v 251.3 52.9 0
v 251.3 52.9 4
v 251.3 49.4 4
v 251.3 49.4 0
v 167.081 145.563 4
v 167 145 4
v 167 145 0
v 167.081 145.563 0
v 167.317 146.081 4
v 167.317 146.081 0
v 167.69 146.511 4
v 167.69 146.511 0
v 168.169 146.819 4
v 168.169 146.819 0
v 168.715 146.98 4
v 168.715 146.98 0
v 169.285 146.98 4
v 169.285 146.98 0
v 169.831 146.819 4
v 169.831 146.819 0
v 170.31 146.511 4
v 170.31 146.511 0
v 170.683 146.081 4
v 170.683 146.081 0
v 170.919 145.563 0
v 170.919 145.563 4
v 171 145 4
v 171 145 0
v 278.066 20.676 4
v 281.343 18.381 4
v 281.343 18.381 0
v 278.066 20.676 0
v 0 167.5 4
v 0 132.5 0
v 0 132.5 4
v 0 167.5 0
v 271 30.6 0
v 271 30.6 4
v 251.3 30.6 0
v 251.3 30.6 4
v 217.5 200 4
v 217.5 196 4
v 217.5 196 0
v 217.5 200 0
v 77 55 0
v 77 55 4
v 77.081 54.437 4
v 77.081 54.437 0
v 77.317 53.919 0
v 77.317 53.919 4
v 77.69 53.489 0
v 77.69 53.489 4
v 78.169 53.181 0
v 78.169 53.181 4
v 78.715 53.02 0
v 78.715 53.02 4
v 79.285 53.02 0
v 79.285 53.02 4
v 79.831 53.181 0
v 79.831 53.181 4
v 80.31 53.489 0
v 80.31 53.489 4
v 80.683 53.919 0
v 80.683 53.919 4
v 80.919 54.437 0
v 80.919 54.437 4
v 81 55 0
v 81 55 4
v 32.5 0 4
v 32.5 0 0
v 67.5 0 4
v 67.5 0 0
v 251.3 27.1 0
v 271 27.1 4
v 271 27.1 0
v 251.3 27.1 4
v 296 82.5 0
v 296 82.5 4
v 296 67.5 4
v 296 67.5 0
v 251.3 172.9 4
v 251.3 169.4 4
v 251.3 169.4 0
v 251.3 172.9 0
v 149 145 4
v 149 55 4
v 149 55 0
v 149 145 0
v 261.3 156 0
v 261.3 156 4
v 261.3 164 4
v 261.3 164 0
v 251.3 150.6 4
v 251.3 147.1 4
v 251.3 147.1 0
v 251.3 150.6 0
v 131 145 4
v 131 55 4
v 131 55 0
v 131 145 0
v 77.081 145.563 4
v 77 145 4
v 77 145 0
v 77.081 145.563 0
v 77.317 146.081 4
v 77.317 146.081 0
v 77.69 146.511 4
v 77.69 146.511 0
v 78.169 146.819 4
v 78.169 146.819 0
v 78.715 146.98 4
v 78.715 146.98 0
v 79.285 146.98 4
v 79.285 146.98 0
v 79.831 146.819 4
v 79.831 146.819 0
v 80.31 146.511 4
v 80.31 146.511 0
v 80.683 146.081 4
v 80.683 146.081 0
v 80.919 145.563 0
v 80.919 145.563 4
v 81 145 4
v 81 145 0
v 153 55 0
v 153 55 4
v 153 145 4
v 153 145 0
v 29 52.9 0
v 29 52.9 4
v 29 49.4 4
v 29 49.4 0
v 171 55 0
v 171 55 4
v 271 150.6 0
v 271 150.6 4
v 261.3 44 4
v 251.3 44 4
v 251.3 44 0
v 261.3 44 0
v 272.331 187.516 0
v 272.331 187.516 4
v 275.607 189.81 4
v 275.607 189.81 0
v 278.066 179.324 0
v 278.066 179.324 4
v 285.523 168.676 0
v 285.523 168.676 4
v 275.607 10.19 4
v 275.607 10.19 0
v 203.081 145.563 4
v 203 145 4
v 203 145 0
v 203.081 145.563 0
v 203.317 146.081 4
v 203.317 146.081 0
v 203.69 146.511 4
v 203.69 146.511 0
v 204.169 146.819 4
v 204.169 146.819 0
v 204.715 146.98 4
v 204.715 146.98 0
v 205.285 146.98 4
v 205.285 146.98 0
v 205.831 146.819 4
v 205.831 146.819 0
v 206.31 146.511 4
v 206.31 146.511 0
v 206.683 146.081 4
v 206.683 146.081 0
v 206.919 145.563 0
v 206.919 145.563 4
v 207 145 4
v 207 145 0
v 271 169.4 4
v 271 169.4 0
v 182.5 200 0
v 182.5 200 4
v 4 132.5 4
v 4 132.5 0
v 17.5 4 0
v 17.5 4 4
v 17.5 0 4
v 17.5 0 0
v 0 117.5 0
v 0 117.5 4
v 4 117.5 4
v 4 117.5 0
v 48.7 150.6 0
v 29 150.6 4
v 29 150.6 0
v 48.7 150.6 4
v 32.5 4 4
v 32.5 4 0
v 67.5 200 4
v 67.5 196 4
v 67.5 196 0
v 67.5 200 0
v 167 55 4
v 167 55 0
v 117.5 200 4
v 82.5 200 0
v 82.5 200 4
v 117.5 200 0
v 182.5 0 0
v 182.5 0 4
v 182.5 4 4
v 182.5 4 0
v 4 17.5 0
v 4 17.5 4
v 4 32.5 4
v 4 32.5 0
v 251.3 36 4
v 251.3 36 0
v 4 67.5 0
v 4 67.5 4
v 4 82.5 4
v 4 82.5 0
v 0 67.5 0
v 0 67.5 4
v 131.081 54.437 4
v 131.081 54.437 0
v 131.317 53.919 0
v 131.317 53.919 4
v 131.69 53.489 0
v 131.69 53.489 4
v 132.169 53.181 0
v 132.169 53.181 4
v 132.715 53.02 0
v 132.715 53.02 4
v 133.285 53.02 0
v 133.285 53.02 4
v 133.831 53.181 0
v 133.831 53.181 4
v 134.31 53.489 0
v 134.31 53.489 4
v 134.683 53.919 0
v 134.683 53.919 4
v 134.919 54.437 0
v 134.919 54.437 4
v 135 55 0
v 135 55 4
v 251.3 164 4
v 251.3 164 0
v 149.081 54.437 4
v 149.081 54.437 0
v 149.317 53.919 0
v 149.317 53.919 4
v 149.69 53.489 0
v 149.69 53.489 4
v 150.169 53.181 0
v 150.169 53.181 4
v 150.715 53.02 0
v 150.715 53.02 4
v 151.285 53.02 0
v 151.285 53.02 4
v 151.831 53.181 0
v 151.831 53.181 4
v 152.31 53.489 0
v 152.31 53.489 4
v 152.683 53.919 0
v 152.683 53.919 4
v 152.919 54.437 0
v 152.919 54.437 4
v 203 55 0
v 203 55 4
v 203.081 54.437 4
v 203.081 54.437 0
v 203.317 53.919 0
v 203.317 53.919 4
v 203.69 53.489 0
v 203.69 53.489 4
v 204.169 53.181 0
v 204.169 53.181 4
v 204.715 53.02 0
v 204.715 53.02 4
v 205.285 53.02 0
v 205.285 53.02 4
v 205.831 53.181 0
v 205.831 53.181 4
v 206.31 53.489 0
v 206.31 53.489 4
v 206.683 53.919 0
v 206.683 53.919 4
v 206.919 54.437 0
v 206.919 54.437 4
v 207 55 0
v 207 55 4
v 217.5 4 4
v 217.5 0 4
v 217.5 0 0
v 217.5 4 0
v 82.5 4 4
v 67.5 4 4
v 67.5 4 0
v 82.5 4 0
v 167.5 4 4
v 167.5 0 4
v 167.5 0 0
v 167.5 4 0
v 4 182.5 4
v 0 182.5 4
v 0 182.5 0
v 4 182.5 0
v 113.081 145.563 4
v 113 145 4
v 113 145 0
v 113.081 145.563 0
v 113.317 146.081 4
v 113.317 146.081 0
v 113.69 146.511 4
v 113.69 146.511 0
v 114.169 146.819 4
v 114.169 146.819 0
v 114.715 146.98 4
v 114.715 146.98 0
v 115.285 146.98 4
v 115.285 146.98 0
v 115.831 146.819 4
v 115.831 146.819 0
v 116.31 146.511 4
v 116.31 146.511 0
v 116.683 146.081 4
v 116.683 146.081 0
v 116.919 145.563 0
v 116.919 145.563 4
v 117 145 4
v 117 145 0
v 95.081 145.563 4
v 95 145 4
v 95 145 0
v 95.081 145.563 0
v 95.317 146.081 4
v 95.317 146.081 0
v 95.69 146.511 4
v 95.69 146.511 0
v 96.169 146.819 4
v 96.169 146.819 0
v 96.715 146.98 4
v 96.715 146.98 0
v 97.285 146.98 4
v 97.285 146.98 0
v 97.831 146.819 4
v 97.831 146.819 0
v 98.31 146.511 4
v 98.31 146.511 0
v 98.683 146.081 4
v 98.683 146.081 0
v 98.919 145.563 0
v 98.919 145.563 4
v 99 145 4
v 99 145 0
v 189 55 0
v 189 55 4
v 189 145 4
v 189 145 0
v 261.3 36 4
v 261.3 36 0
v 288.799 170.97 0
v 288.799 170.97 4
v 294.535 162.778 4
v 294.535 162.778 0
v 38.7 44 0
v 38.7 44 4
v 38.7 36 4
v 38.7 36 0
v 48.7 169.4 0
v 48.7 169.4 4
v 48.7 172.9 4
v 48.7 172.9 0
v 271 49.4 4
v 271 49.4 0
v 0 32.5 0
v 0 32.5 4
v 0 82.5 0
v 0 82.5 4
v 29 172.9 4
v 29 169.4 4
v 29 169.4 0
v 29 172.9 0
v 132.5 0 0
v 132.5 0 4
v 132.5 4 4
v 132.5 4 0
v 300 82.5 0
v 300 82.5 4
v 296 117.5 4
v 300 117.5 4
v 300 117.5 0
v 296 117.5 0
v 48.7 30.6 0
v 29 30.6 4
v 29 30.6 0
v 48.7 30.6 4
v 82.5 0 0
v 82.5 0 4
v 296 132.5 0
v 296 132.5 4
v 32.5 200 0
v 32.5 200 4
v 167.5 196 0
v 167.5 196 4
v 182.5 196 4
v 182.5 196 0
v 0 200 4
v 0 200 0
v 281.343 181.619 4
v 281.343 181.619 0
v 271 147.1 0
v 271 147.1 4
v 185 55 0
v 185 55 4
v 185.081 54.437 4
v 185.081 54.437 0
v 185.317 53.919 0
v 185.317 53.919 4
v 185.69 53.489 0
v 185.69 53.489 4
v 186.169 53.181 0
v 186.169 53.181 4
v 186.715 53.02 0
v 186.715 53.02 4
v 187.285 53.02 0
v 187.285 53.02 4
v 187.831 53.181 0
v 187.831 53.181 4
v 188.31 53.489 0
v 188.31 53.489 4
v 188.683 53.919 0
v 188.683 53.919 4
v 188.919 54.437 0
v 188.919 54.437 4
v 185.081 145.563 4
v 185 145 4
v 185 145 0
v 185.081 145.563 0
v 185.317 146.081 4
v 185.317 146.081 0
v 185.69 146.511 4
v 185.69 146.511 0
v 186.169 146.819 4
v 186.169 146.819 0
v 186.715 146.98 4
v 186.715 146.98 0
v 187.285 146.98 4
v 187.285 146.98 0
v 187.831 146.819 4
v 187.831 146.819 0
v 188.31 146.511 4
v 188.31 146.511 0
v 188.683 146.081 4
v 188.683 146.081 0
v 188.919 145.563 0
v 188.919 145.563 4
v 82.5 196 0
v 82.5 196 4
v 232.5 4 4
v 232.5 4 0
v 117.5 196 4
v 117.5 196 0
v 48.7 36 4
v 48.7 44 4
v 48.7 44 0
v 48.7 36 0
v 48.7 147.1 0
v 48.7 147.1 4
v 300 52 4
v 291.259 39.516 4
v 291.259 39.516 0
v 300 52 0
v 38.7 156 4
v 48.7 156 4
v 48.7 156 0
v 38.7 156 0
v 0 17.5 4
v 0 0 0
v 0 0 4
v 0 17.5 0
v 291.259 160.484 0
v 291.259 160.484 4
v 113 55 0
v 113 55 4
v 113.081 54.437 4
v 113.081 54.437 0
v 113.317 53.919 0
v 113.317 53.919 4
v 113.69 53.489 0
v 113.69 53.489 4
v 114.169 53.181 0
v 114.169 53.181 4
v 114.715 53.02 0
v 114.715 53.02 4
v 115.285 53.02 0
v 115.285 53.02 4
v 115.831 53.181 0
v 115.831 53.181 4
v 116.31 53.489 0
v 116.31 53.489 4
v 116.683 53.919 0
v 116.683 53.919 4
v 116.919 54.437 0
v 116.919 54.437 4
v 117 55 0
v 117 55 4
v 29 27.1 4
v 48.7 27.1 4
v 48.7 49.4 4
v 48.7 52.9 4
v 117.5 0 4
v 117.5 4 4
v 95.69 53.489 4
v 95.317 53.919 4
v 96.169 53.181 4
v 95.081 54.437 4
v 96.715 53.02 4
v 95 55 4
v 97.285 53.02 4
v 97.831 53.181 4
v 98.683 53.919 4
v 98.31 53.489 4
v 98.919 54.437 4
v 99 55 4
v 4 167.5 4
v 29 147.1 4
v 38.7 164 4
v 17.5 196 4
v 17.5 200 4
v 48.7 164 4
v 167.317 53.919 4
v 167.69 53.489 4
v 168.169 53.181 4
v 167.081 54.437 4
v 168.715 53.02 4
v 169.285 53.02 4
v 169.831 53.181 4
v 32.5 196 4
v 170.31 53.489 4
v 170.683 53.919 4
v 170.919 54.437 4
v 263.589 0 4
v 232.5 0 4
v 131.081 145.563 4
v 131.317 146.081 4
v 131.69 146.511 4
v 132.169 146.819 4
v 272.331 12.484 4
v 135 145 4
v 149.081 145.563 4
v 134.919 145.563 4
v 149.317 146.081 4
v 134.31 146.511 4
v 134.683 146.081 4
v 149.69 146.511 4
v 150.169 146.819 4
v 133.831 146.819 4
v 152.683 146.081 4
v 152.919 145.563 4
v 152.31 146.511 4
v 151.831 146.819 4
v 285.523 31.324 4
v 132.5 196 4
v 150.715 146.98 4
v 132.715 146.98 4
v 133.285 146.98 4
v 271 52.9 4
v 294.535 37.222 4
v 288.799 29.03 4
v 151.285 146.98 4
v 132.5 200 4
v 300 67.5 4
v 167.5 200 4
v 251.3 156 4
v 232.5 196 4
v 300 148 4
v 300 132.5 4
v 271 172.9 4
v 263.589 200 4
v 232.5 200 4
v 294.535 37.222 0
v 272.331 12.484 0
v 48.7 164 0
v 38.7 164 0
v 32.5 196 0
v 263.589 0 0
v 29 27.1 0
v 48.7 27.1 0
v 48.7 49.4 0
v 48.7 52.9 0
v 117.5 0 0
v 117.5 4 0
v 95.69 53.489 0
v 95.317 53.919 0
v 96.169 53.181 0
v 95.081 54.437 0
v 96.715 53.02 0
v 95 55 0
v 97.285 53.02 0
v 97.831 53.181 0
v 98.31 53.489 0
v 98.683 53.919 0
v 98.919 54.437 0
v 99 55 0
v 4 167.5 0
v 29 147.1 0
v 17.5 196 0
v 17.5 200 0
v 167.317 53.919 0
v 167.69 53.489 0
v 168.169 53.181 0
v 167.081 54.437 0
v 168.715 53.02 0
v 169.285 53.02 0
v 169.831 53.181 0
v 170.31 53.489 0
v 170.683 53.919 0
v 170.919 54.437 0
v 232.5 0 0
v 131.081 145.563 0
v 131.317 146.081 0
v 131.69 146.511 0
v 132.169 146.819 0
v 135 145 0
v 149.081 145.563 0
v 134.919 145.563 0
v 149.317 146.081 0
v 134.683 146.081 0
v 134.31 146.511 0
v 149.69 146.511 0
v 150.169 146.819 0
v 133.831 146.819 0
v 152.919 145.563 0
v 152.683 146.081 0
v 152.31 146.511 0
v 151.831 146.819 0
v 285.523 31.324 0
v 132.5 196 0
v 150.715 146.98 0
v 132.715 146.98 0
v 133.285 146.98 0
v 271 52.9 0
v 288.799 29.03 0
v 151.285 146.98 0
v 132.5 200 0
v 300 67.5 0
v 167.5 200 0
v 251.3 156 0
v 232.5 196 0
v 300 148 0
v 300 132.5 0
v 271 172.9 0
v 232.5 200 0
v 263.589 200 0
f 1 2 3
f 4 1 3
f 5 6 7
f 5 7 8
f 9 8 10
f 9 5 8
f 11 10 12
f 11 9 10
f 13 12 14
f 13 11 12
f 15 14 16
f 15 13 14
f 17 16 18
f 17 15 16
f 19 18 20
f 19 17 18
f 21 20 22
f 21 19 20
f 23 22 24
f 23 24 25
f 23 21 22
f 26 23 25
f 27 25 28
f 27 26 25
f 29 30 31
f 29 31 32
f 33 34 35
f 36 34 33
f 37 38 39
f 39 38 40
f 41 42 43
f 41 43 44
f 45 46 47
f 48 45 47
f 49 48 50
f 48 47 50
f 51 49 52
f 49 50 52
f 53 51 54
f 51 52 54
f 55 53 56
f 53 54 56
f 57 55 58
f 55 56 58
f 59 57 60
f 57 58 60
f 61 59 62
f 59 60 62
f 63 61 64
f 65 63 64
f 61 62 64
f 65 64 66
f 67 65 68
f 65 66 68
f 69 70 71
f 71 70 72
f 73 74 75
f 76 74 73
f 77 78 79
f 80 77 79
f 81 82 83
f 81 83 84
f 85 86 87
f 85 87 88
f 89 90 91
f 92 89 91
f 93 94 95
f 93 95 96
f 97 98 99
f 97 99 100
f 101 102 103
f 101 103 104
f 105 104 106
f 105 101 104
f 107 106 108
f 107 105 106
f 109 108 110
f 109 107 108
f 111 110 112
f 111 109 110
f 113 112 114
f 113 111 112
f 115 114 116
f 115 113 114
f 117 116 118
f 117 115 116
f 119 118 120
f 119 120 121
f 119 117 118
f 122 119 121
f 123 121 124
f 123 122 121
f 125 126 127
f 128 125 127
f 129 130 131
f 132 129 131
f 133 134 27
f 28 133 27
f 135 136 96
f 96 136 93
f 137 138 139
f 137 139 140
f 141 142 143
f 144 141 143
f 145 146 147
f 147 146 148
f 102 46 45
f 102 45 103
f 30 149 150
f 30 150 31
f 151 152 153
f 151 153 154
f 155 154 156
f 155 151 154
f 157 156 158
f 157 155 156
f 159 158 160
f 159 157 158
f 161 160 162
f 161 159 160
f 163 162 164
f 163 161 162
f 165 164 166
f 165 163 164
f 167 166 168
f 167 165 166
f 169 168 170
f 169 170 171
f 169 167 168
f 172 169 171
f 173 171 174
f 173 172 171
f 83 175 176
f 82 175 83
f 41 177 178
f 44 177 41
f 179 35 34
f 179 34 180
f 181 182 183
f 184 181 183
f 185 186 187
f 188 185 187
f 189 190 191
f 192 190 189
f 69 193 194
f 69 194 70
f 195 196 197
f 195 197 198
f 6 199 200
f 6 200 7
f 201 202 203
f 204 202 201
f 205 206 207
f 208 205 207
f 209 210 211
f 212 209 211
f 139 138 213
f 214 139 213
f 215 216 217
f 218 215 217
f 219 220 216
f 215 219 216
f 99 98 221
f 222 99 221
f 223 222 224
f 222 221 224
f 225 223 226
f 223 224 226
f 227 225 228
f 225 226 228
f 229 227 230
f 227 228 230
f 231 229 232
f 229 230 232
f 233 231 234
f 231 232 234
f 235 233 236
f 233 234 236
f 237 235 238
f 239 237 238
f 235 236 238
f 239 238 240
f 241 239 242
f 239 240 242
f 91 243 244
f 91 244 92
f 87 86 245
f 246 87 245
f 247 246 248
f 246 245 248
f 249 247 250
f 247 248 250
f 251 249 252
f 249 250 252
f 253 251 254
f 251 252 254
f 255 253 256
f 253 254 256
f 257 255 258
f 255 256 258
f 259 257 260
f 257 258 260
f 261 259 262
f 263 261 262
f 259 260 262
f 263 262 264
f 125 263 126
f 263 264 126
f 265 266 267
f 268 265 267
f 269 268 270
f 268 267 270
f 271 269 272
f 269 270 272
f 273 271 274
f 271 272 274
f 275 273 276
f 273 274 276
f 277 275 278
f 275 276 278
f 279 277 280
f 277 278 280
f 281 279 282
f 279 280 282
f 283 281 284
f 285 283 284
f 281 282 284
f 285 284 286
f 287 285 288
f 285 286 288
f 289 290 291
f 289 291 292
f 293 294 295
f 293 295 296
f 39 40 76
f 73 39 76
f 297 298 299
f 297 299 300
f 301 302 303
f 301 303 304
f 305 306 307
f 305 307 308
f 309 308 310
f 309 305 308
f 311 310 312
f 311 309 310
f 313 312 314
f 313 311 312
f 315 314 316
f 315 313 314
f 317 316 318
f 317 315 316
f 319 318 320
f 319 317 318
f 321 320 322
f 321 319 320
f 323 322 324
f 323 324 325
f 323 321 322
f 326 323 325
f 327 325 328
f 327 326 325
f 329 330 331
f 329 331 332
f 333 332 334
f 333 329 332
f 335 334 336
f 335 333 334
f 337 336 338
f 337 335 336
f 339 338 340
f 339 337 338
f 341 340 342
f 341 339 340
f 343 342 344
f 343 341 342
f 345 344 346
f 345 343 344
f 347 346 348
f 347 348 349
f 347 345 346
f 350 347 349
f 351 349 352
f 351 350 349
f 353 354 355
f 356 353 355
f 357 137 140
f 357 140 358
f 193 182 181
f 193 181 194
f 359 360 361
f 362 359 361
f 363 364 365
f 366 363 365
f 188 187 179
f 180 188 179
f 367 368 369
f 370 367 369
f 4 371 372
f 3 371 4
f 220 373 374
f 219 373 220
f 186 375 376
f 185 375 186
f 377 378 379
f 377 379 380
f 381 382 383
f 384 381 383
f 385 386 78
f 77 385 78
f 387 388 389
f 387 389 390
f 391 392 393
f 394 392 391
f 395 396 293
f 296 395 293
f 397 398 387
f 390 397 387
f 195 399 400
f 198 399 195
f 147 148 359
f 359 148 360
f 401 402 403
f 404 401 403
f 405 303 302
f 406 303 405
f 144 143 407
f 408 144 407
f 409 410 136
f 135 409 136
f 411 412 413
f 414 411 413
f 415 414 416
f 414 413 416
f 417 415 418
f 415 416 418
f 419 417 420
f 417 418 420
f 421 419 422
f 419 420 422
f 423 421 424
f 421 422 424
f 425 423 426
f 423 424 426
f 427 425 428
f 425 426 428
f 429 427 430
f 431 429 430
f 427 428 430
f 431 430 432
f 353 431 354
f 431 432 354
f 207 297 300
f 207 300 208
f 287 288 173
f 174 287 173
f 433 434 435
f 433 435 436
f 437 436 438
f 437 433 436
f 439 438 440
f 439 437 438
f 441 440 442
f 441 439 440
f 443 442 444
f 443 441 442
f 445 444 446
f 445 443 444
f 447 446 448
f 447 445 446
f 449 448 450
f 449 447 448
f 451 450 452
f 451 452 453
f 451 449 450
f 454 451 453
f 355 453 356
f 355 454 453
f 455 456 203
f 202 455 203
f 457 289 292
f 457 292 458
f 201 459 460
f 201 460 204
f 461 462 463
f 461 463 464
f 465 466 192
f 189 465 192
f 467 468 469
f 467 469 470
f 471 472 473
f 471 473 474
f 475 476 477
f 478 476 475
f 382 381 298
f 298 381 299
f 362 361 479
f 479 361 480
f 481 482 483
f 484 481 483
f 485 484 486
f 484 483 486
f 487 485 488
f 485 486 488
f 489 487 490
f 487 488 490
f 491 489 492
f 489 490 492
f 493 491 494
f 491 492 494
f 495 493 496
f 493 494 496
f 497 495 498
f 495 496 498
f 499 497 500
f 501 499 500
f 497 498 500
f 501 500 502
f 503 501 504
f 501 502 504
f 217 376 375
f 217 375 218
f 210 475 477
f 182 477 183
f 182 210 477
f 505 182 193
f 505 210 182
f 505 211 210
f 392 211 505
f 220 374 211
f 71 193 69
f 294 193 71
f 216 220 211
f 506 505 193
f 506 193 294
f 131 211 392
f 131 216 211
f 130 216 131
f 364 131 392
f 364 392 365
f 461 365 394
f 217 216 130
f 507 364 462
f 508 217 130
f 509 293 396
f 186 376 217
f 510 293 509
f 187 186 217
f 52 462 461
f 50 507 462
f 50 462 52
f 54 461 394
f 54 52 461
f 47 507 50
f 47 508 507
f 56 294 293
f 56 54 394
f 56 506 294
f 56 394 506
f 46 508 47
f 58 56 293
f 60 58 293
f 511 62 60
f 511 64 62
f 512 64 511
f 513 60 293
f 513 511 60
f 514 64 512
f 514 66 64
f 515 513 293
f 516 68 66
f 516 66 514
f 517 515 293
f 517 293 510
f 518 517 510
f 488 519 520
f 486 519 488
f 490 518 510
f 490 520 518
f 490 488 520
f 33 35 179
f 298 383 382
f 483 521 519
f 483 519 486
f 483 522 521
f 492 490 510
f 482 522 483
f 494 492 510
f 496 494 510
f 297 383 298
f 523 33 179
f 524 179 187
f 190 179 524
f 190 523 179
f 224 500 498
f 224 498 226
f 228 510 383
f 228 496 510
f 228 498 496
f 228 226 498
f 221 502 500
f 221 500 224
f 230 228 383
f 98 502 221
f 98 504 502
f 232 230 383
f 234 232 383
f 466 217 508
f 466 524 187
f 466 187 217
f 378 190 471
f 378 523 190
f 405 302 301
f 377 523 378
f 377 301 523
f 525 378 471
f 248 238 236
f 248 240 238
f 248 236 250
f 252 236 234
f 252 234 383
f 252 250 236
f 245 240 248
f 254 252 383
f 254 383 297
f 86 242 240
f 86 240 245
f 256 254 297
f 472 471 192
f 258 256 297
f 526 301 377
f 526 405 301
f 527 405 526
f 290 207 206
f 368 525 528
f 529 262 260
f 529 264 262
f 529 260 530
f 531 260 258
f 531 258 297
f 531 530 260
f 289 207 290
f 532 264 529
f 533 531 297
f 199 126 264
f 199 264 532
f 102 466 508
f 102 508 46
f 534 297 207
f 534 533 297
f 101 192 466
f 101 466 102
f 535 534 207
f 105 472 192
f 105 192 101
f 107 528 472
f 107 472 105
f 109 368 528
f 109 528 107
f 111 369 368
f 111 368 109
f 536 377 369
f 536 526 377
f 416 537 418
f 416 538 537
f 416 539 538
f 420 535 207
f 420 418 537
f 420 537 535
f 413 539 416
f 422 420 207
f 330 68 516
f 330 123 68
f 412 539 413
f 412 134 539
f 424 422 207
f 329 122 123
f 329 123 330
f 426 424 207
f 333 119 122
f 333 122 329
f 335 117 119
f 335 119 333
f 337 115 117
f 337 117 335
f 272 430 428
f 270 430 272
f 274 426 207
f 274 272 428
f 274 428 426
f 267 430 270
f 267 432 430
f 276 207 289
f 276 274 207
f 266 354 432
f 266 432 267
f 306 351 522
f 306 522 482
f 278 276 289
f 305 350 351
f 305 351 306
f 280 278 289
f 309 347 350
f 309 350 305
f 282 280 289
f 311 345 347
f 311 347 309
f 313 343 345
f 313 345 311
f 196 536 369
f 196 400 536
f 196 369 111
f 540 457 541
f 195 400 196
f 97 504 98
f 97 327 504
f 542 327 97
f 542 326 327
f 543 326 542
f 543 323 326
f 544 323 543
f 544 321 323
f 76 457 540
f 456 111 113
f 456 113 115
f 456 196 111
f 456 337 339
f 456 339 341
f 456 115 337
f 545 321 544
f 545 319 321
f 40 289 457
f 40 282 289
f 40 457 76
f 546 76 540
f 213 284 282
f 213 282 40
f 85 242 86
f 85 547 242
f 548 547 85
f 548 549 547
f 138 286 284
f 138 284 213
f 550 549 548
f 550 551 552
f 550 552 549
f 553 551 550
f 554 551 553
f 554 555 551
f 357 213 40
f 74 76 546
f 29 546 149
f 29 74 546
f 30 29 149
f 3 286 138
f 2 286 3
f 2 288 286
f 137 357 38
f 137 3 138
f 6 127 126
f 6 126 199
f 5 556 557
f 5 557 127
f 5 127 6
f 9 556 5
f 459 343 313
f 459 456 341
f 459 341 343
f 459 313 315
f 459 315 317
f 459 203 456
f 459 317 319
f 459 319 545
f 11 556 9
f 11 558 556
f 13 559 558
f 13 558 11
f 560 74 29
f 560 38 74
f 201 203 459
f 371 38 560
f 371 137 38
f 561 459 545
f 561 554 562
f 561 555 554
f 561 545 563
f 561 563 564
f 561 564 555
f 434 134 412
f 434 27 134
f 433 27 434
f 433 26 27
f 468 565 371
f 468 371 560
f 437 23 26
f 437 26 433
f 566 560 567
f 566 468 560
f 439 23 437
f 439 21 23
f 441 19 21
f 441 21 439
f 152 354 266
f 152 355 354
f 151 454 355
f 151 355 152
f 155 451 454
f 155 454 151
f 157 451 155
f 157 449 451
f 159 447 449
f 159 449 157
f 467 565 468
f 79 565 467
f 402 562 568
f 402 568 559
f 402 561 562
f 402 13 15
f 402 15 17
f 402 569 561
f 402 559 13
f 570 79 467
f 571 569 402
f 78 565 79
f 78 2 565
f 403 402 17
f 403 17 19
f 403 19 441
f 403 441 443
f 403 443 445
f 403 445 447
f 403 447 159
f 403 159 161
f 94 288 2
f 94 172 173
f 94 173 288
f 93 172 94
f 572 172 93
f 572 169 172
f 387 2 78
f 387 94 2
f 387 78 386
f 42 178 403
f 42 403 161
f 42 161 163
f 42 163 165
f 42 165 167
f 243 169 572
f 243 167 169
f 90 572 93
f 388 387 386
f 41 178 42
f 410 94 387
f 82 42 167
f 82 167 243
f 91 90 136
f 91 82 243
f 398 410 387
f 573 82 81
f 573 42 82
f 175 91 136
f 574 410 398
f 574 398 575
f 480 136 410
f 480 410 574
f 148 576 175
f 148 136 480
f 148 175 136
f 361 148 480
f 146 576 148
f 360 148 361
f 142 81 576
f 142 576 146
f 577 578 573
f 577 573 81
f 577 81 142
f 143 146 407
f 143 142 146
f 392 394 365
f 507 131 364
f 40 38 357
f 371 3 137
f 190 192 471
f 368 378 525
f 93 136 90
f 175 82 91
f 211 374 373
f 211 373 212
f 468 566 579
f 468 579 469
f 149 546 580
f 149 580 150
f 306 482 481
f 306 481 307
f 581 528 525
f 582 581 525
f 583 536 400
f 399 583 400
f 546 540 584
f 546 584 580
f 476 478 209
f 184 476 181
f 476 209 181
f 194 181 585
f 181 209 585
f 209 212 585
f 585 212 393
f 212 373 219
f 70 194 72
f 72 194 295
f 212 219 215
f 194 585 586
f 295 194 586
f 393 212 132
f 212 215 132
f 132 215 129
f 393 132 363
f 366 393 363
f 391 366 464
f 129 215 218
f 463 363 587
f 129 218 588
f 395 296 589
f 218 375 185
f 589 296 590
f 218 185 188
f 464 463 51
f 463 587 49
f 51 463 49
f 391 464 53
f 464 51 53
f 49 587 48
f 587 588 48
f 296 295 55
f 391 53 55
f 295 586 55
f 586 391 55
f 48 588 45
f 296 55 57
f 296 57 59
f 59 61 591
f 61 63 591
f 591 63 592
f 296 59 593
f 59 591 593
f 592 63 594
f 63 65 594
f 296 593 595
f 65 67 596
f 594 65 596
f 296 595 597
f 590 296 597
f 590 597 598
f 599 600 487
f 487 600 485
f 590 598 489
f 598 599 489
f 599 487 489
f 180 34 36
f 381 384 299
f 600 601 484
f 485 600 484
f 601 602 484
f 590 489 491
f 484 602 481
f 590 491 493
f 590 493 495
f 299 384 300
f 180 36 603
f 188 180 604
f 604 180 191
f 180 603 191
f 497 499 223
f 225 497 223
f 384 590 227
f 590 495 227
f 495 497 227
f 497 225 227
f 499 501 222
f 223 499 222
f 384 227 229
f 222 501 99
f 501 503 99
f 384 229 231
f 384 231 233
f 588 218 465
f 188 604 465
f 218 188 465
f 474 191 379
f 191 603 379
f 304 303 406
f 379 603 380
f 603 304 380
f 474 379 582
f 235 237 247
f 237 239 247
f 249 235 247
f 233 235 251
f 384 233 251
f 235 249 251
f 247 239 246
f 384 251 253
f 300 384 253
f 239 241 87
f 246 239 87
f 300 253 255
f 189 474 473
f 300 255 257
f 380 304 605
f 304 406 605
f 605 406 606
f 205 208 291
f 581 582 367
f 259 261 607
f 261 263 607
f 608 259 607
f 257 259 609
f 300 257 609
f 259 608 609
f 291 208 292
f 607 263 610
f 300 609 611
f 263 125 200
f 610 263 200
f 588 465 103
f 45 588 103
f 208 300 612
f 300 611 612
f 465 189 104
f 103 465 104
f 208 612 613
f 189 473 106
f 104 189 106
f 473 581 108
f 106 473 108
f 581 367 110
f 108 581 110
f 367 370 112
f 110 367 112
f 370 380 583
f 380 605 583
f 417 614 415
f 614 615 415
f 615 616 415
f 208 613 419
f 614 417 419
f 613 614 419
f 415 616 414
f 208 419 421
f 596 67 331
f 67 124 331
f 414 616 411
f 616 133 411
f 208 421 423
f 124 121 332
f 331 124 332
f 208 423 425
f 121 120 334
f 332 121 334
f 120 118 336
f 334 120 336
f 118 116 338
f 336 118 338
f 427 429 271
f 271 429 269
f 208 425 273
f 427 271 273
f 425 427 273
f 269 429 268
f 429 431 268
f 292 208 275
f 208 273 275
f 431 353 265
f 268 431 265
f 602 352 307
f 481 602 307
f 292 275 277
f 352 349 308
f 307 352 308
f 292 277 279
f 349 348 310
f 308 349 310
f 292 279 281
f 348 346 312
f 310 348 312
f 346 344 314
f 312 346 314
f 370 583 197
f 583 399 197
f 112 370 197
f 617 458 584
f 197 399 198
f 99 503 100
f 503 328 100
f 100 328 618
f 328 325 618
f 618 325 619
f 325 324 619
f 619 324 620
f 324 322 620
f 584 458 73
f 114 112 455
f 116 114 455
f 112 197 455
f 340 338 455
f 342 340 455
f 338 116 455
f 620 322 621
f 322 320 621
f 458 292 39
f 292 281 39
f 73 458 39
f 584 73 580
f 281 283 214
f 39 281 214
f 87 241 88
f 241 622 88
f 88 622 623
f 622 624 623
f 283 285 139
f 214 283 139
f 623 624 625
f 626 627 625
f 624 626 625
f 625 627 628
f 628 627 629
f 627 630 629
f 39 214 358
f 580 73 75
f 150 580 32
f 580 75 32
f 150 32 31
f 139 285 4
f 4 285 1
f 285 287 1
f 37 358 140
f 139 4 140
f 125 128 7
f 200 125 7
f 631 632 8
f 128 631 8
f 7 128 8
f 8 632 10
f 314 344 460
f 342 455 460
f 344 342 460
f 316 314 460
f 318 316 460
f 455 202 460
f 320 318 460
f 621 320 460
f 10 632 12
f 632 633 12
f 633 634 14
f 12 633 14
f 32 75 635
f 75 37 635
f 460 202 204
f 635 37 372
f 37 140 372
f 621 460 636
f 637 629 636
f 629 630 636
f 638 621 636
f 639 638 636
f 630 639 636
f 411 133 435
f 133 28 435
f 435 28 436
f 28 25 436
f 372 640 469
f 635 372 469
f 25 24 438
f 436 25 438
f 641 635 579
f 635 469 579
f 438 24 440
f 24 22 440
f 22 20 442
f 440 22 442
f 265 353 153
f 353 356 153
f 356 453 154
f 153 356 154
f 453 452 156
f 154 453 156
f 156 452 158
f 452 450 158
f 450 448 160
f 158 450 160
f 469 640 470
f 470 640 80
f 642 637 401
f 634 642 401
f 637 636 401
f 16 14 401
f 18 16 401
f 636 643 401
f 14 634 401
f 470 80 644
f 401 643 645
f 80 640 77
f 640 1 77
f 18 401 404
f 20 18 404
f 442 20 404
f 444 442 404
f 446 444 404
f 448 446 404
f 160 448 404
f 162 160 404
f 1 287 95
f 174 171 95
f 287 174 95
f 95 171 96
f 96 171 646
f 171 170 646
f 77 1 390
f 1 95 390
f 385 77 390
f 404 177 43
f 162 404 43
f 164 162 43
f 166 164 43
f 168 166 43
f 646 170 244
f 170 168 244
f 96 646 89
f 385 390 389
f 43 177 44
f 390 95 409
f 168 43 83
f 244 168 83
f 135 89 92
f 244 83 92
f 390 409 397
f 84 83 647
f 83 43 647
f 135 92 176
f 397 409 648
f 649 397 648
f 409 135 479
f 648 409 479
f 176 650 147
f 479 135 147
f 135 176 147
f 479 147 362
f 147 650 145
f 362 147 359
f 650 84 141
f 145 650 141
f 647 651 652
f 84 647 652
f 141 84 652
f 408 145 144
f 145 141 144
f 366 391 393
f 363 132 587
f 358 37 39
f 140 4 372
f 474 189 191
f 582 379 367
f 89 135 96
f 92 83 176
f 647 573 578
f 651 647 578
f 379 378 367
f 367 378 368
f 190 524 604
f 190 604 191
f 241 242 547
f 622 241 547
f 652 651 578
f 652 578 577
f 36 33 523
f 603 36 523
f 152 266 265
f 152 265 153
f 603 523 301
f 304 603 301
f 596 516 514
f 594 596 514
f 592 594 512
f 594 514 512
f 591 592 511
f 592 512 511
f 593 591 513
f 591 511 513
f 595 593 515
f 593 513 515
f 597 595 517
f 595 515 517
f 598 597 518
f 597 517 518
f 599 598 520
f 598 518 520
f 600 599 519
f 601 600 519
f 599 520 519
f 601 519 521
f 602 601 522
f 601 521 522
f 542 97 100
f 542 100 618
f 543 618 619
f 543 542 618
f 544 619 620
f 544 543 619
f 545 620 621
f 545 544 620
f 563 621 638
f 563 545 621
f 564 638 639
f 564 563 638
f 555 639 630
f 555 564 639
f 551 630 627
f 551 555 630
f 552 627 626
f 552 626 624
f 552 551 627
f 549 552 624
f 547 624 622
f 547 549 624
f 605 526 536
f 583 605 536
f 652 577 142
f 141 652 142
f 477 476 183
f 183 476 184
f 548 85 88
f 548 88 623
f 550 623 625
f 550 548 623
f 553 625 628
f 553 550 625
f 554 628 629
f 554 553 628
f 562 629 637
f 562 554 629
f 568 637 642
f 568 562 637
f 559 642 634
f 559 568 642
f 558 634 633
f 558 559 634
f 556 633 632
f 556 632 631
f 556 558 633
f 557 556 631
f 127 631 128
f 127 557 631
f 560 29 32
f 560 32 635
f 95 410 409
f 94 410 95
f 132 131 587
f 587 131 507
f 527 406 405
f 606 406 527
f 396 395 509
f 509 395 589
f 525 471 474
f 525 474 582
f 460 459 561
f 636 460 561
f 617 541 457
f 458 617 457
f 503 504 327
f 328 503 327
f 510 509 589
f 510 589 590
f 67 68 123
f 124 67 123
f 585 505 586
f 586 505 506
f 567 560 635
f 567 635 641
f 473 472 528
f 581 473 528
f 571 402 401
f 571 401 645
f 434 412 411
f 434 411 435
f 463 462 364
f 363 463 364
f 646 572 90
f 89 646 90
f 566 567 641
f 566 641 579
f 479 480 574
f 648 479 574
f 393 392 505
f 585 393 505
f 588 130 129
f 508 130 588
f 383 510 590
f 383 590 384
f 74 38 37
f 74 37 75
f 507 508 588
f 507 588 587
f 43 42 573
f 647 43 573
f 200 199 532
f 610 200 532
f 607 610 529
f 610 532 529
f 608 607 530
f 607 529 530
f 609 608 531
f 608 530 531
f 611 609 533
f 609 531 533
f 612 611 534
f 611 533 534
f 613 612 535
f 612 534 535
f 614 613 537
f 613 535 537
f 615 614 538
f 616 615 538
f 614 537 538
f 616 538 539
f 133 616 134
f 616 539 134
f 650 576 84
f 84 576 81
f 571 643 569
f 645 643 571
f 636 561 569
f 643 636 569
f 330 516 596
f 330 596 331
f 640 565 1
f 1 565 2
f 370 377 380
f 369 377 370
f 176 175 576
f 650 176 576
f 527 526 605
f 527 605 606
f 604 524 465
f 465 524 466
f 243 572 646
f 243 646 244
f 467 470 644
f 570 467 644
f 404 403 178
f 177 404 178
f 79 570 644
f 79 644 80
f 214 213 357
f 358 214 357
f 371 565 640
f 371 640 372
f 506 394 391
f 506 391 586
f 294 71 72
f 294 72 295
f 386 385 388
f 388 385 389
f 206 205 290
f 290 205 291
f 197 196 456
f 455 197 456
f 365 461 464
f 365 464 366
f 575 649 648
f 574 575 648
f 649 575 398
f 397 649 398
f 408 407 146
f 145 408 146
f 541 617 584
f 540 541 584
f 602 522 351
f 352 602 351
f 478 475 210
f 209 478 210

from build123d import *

# Parameters (mm, degrees)
SKIZZE2_W                       = 300
SKIZZE2_H                       = 200
AUFSATZ_LINEAR_AUSTRAGEN1_DEPTH = 4
SKIZZE3_W                       = 15
SKIZZE3_H                       = 4
SCHNITT_LINEAR_AUSTRAGEN1_DEPTH = 4
LINEARES_MUSTER1_COUNT          = 6
LINEARES_MUSTER1_PITCH          = 50
SPIEGELN1_COPY_1_SKETCH_W       = 15
SPIEGELN1_COPY_1_SKETCH_H       = 4
SPIEGELN1_COPY_1_DEPTH          = 4
SPIEGELN1_COPY_2_SKETCH_W       = 15
SPIEGELN1_COPY_2_SKETCH_H       = 4
SPIEGELN1_COPY_2_DEPTH          = 4
SPIEGELN1_COPY_3_SKETCH_W       = 15
SPIEGELN1_COPY_3_SKETCH_H       = 4
SPIEGELN1_COPY_3_DEPTH          = 4
SPIEGELN1_COPY_4_SKETCH_W       = 15
SPIEGELN1_COPY_4_SKETCH_H       = 4
SPIEGELN1_COPY_4_DEPTH          = 4
SPIEGELN1_COPY_5_SKETCH_W       = 15
SPIEGELN1_COPY_5_SKETCH_H       = 4
SPIEGELN1_COPY_5_DEPTH          = 4
SKIZZE4_W                       = 4
SKIZZE4_H                       = 15
SCHNITT_LINEAR_AUSTRAGEN2_DEPTH = 4
LINEARES_MUSTER2_COUNT          = 4
LINEARES_MUSTER2_PITCH          = 50
SPIEGELN2_COPY_1_SKETCH_W       = 4
SPIEGELN2_COPY_1_SKETCH_H       = 15
SPIEGELN2_COPY_1_DEPTH          = 4
SPIEGELN2_COPY_2_SKETCH_W       = 4
SPIEGELN2_COPY_2_SKETCH_H       = 15
SPIEGELN2_COPY_2_DEPTH          = 4
SPIEGELN2_COPY_3_SKETCH_W       = 4
SPIEGELN2_COPY_3_SKETCH_H       = 15
SPIEGELN2_COPY_3_DEPTH          = 4
SKIZZE5_W                       = 19.7
SKIZZE5_H                       = 3.5
SCHNITT_LINEAR_AUSTRAGEN3_DEPTH = 4
SPIEGELN4_COPY_1_SKETCH_W       = 19.7
SPIEGELN4_COPY_1_SKETCH_H       = 3.5
SPIEGELN4_COPY_1_DEPTH          = 4
SCHNITT_LINEAR_AUSTRAGEN4_DEPTH = 4
SKIZZE8_W                       = 10
SKIZZE8_H                       = 8
SCHNITT_LINEAR_AUSTRAGEN5_DEPTH = 4
SPIEGELN7_COPY_1_SKETCH_W       = 10
SPIEGELN7_COPY_1_SKETCH_H       = 8
SPIEGELN7_COPY_1_DEPTH          = 4
SCHNITT_LINEAR_AUSTRAGEN6_DEPTH = 4
LINEARES_MUSTER3_COUNT          = 8
LINEARES_MUSTER3_PITCH          = 18
LINEARES_MUSTER3_COPY_1_DEPTH   = 4
LINEARES_MUSTER3_COPY_2_DEPTH   = 4
LINEARES_MUSTER3_COPY_3_DEPTH   = 4
LINEARES_MUSTER3_COPY_4_DEPTH   = 4
LINEARES_MUSTER3_COPY_5_DEPTH   = 4
LINEARES_MUSTER3_COPY_6_DEPTH   = 4
LINEARES_MUSTER3_COPY_7_DEPTH   = 4


with BuildPart() as part:
    # Skizze2 → Aufsatz-Linear austragen1 (new body)
    with BuildSketch(Plane.XY):
        with Locations((150, 100)):
            Rectangle(SKIZZE2_W, SKIZZE2_H)
    extrude(amount=AUFSATZ_LINEAR_AUSTRAGEN1_DEPTH)

    # Skizze3 → Schnitt-Linear austragen1 (cut)
    with BuildSketch(Plane.XY.offset(4)):
        with Locations((25, 198)):
            Rectangle(SKIZZE3_W, SKIZZE3_H)
    schnitt_linear_austragen1 = extrude(amount=-SCHNITT_LINEAR_AUSTRAGEN1_DEPTH, mode=Mode.SUBTRACT)

    # Lineares Muster1: Schnitt-Linear austragen1 ×6
    with Locations(*[(i * LINEARES_MUSTER1_PITCH, 0, 0) for i in range(1, LINEARES_MUSTER1_COUNT)]):
        add(schnitt_linear_austragen1, mode=Mode.SUBTRACT)

    # Spiegeln1: Schnitt-Linear austragen1 across plane
    add(schnitt_linear_austragen1.mirror(Plane.ZX.offset(100)), mode=Mode.SUBTRACT)

    # Spiegeln1 copy 1 sketch → Spiegeln1 copy 1 (cut)
    with BuildSketch(Plane(origin=(50, 200, 4), x_dir=(1, 0, 0), z_dir=(0, 0, 1))):
        with Locations((25, -198)):
            Rectangle(SPIEGELN1_COPY_1_SKETCH_W, SPIEGELN1_COPY_1_SKETCH_H)
    extrude(amount=-SPIEGELN1_COPY_1_DEPTH, mode=Mode.SUBTRACT)

    # Spiegeln1 copy 2 sketch → Spiegeln1 copy 2 (cut)
    with BuildSketch(Plane(origin=(100, 200, 4), x_dir=(1, 0, 0), z_dir=(0, 0, 1))):
        with Locations((25, -198)):
            Rectangle(SPIEGELN1_COPY_2_SKETCH_W, SPIEGELN1_COPY_2_SKETCH_H)
    extrude(amount=-SPIEGELN1_COPY_2_DEPTH, mode=Mode.SUBTRACT)

    # Spiegeln1 copy 3 sketch → Spiegeln1 copy 3 (cut)
    with BuildSketch(Plane(origin=(150, 200, 4), x_dir=(1, 0, 0), z_dir=(0, 0, 1))):
        with Locations((25, -198)):
            Rectangle(SPIEGELN1_COPY_3_SKETCH_W, SPIEGELN1_COPY_3_SKETCH_H)
    extrude(amount=-SPIEGELN1_COPY_3_DEPTH, mode=Mode.SUBTRACT)

    # Spiegeln1 copy 4 sketch → Spiegeln1 copy 4 (cut)
    with BuildSketch(Plane(origin=(200, 200, 4), x_dir=(1, 0, 0), z_dir=(0, 0, 1))):
        with Locations((25, -198)):
            Rectangle(SPIEGELN1_COPY_4_SKETCH_W, SPIEGELN1_COPY_4_SKETCH_H)
    extrude(amount=-SPIEGELN1_COPY_4_DEPTH, mode=Mode.SUBTRACT)

    # Spiegeln1 copy 5 sketch → Spiegeln1 copy 5 (cut)
    with BuildSketch(Plane(origin=(250, 200, 4), x_dir=(1, 0, 0), z_dir=(0, 0, 1))):
        with Locations((25, -198)):
            Rectangle(SPIEGELN1_COPY_5_SKETCH_W, SPIEGELN1_COPY_5_SKETCH_H)
    extrude(amount=-SPIEGELN1_COPY_5_DEPTH, mode=Mode.SUBTRACT)

    # Skizze4 → Schnitt-Linear austragen2 (cut)
    with BuildSketch(Plane.XY.offset(4)):
        with Locations((2, 175)):
            Rectangle(SKIZZE4_W, SKIZZE4_H)
    schnitt_linear_austragen2 = extrude(amount=-SCHNITT_LINEAR_AUSTRAGEN2_DEPTH, mode=Mode.SUBTRACT)

    # Lineares Muster2: Schnitt-Linear austragen2 ×4
    with Locations(*[(0, -i * LINEARES_MUSTER2_PITCH, 0) for i in range(1, LINEARES_MUSTER2_COUNT)]):
        add(schnitt_linear_austragen2, mode=Mode.SUBTRACT)

    # Spiegeln2: Schnitt-Linear austragen2 across plane
    add(schnitt_linear_austragen2.mirror(Plane.ZY.offset(-150)), mode=Mode.SUBTRACT)

    # Spiegeln2 copy 1 sketch → Spiegeln2 copy 1 (cut)
    with BuildSketch(Plane(origin=(300, -50, 4), x_dir=(-1, 0, 0), z_dir=(0, 0, 1))):
        with Locations((2, -175)):
            Rectangle(SPIEGELN2_COPY_1_SKETCH_W, SPIEGELN2_COPY_1_SKETCH_H)
    extrude(amount=-SPIEGELN2_COPY_1_DEPTH, mode=Mode.SUBTRACT)

    # Spiegeln2 copy 2 sketch → Spiegeln2 copy 2 (cut)
    with BuildSketch(Plane(origin=(300, -100, 4), x_dir=(-1, 0, 0), z_dir=(0, 0, 1))):
        with Locations((2, -175)):
            Rectangle(SPIEGELN2_COPY_2_SKETCH_W, SPIEGELN2_COPY_2_SKETCH_H)
    extrude(amount=-SPIEGELN2_COPY_2_DEPTH, mode=Mode.SUBTRACT)

    # Spiegeln2 copy 3 sketch → Spiegeln2 copy 3 (cut)
    with BuildSketch(Plane(origin=(300, -150, 4), x_dir=(-1, 0, 0), z_dir=(0, 0, 1))):
        with Locations((2, -175)):
            Rectangle(SPIEGELN2_COPY_3_SKETCH_W, SPIEGELN2_COPY_3_SKETCH_H)
    extrude(amount=-SPIEGELN2_COPY_3_DEPTH, mode=Mode.SUBTRACT)

    # Skizze5 → Schnitt-Linear austragen3 (cut)
    with BuildSketch(Plane.XY.offset(4)):
        with Locations((38.85, 171.15)):
            Rectangle(SKIZZE5_W, SKIZZE5_H)
        with Locations((38.85, 148.85)):
            Rectangle(SKIZZE5_W, SKIZZE5_H)
    schnitt_linear_austragen3 = extrude(amount=-SCHNITT_LINEAR_AUSTRAGEN3_DEPTH, mode=Mode.SUBTRACT)

    # Spiegeln3: Schnitt-Linear austragen3 across plane
    add(schnitt_linear_austragen3.mirror(Plane.ZY.offset(-150)), mode=Mode.SUBTRACT)

    # Spiegeln4: Schnitt-Linear austragen3 across plane
    add(schnitt_linear_austragen3.mirror(Plane.ZX.offset(100)), mode=Mode.SUBTRACT)

    # Spiegeln4 copy 1 sketch → Spiegeln4 copy 1 (cut)
    with BuildSketch(Plane(origin=(300, 200, 4), x_dir=(-1, 0, 0), z_dir=(0, 0, 1))):
        with Locations((38.85, 171.15)):
            Rectangle(SPIEGELN4_COPY_1_SKETCH_W, SPIEGELN4_COPY_1_SKETCH_H)
        with Locations((38.85, 148.85)):
            Rectangle(SPIEGELN4_COPY_1_SKETCH_W, SPIEGELN4_COPY_1_SKETCH_H)
    extrude(amount=-SPIEGELN4_COPY_1_DEPTH, mode=Mode.SUBTRACT)

    # Skizze7 → Schnitt-Linear austragen4 (cut)
    with BuildSketch(Plane.XY.offset(4)):
        Polygon((263.589208013, 0), (272.330592807, 12.483991269), (275.607200984, 10.189685524), (281.342965347, 18.381205967), (278.06635717, 20.675511712), (285.522850843, 31.324488288), (288.79945902, 29.030182542), (294.535223383, 37.221702985), (291.258615206, 39.516008731), (300, 52), (300, 0), align=None)
    schnitt_linear_austragen4 = extrude(amount=-SCHNITT_LINEAR_AUSTRAGEN4_DEPTH, mode=Mode.SUBTRACT)

    # Spiegeln5: Schnitt-Linear austragen4 across plane
    add(schnitt_linear_austragen4.mirror(Plane.ZX.offset(100)), mode=Mode.SUBTRACT)

    # Skizze8 → Schnitt-Linear austragen5 (cut)
    with BuildSketch(Plane.XY.offset(4)):
        with Locations((256.3, 160)):
            Rectangle(SKIZZE8_W, SKIZZE8_H)
    schnitt_linear_austragen5 = extrude(amount=-SCHNITT_LINEAR_AUSTRAGEN5_DEPTH, mode=Mode.SUBTRACT)

    # Spiegeln6: Schnitt-Linear austragen5 across plane
    add(schnitt_linear_austragen5.mirror(Plane.ZY.offset(-150)), mode=Mode.SUBTRACT)

    # Spiegeln7: Schnitt-Linear austragen5 across plane
    add(schnitt_linear_austragen5.mirror(Plane.ZX.offset(100)), mode=Mode.SUBTRACT)

    # Spiegeln7 copy 1 sketch → Spiegeln7 copy 1 (cut)
    with BuildSketch(Plane(origin=(300, 200, 4), x_dir=(-1, 0, 0), z_dir=(0, 0, 1))):
        with Locations((256.3, 160)):
            Rectangle(SPIEGELN7_COPY_1_SKETCH_W, SPIEGELN7_COPY_1_SKETCH_H)
    extrude(amount=-SPIEGELN7_COPY_1_DEPTH, mode=Mode.SUBTRACT)

    # Skizze9 → Schnitt-Linear austragen6 (cut)
    with BuildSketch(Plane.XY.offset(4)):
        with BuildLine():
            Line((207, 100), (203, 100))
            Line((203, 100), (203, 145))
            ThreePointArc((203, 145), (205, 147), (207, 145))
            Line((207, 145), (207, 100))
        make_face()
    schnitt_linear_austragen6 = extrude(amount=-SCHNITT_LINEAR_AUSTRAGEN6_DEPTH, mode=Mode.SUBTRACT)

    # Spiegeln8: Schnitt-Linear austragen6 across plane
    add(schnitt_linear_austragen6.mirror(Plane.ZX.offset(100)), mode=Mode.SUBTRACT)

    # Lineares Muster3: Schnitt-Linear austragen6 ×8
    with Locations(*[(-i * LINEARES_MUSTER3_PITCH, 0, 0) for i in range(1, LINEARES_MUSTER3_COUNT)]):
        add(schnitt_linear_austragen6, mode=Mode.SUBTRACT)

    # Lineares Muster3 copy 1 sketch → Lineares Muster3 copy 1 (cut)
    with BuildSketch(Plane(origin=(-18, 200, 4), x_dir=(1, 0, 0), z_dir=(0, 0, 1))):
        with BuildLine():
            Line((207, -100), (203, -100))
            Line((203, -100), (203, -145))
            ThreePointArc((203, -145), (205, -147), (207, -145))
            Line((207, -145), (207, -100))
        make_face()
    extrude(amount=-LINEARES_MUSTER3_COPY_1_DEPTH, mode=Mode.SUBTRACT)

    # Lineares Muster3 copy 2 sketch → Lineares Muster3 copy 2 (cut)
    with BuildSketch(Plane(origin=(-36, 200, 4), x_dir=(1, 0, 0), z_dir=(0, 0, 1))):
        with BuildLine():
            Line((207, -100), (203, -100))
            Line((203, -100), (203, -145))
            ThreePointArc((203, -145), (205, -147), (207, -145))
            Line((207, -145), (207, -100))
        make_face()
    extrude(amount=-LINEARES_MUSTER3_COPY_2_DEPTH, mode=Mode.SUBTRACT)

    # Lineares Muster3 copy 3 sketch → Lineares Muster3 copy 3 (cut)
    with BuildSketch(Plane(origin=(-54, 200, 4), x_dir=(1, 0, 0), z_dir=(0, 0, 1))):
        with BuildLine():
            Line((207, -100), (203, -100))
            Line((203, -100), (203, -145))
            ThreePointArc((203, -145), (205, -147), (207, -145))
            Line((207, -145), (207, -100))
        make_face()
    extrude(amount=-LINEARES_MUSTER3_COPY_3_DEPTH, mode=Mode.SUBTRACT)

    # Lineares Muster3 copy 4 sketch → Lineares Muster3 copy 4 (cut)
    with BuildSketch(Plane(origin=(-72, 200, 4), x_dir=(1, 0, 0), z_dir=(0, 0, 1))):
        with BuildLine():
            Line((207, -100), (203, -100))
            Line((203, -100), (203, -145))
            ThreePointArc((203, -145), (205, -147), (207, -145))
            Line((207, -145), (207, -100))
        make_face()
    extrude(amount=-LINEARES_MUSTER3_COPY_4_DEPTH, mode=Mode.SUBTRACT)

    # Lineares Muster3 copy 5 sketch → Lineares Muster3 copy 5 (cut)
    with BuildSketch(Plane(origin=(-90, 200, 4), x_dir=(1, 0, 0), z_dir=(0, 0, 1))):
        with BuildLine():
            Line((207, -100), (203, -100))
            Line((203, -100), (203, -145))
            ThreePointArc((203, -145), (205, -147), (207, -145))
            Line((207, -145), (207, -100))
        make_face()
    extrude(amount=-LINEARES_MUSTER3_COPY_5_DEPTH, mode=Mode.SUBTRACT)

    # Lineares Muster3 copy 6 sketch → Lineares Muster3 copy 6 (cut)
    with BuildSketch(Plane(origin=(-108, 200, 4), x_dir=(1, 0, 0), z_dir=(0, 0, 1))):
        with BuildLine():
            Line((207, -100), (203, -100))
            Line((203, -100), (203, -145))
            ThreePointArc((203, -145), (205, -147), (207, -145))
            Line((207, -145), (207, -100))
        make_face()
    extrude(amount=-LINEARES_MUSTER3_COPY_6_DEPTH, mode=Mode.SUBTRACT)

    # Lineares Muster3 copy 7 sketch → Lineares Muster3 copy 7 (cut)
    with BuildSketch(Plane(origin=(-126, 200, 4), x_dir=(1, 0, 0), z_dir=(0, 0, 1))):
        with BuildLine():
            Line((207, -100), (203, -100))
            Line((203, -100), (203, -145))
            ThreePointArc((203, -145), (205, -147), (207, -145))
            Line((207, -145), (207, -100))
        make_face()
    extrude(amount=-LINEARES_MUSTER3_COPY_7_DEPTH, mode=Mode.SUBTRACT)


solid = part.part
